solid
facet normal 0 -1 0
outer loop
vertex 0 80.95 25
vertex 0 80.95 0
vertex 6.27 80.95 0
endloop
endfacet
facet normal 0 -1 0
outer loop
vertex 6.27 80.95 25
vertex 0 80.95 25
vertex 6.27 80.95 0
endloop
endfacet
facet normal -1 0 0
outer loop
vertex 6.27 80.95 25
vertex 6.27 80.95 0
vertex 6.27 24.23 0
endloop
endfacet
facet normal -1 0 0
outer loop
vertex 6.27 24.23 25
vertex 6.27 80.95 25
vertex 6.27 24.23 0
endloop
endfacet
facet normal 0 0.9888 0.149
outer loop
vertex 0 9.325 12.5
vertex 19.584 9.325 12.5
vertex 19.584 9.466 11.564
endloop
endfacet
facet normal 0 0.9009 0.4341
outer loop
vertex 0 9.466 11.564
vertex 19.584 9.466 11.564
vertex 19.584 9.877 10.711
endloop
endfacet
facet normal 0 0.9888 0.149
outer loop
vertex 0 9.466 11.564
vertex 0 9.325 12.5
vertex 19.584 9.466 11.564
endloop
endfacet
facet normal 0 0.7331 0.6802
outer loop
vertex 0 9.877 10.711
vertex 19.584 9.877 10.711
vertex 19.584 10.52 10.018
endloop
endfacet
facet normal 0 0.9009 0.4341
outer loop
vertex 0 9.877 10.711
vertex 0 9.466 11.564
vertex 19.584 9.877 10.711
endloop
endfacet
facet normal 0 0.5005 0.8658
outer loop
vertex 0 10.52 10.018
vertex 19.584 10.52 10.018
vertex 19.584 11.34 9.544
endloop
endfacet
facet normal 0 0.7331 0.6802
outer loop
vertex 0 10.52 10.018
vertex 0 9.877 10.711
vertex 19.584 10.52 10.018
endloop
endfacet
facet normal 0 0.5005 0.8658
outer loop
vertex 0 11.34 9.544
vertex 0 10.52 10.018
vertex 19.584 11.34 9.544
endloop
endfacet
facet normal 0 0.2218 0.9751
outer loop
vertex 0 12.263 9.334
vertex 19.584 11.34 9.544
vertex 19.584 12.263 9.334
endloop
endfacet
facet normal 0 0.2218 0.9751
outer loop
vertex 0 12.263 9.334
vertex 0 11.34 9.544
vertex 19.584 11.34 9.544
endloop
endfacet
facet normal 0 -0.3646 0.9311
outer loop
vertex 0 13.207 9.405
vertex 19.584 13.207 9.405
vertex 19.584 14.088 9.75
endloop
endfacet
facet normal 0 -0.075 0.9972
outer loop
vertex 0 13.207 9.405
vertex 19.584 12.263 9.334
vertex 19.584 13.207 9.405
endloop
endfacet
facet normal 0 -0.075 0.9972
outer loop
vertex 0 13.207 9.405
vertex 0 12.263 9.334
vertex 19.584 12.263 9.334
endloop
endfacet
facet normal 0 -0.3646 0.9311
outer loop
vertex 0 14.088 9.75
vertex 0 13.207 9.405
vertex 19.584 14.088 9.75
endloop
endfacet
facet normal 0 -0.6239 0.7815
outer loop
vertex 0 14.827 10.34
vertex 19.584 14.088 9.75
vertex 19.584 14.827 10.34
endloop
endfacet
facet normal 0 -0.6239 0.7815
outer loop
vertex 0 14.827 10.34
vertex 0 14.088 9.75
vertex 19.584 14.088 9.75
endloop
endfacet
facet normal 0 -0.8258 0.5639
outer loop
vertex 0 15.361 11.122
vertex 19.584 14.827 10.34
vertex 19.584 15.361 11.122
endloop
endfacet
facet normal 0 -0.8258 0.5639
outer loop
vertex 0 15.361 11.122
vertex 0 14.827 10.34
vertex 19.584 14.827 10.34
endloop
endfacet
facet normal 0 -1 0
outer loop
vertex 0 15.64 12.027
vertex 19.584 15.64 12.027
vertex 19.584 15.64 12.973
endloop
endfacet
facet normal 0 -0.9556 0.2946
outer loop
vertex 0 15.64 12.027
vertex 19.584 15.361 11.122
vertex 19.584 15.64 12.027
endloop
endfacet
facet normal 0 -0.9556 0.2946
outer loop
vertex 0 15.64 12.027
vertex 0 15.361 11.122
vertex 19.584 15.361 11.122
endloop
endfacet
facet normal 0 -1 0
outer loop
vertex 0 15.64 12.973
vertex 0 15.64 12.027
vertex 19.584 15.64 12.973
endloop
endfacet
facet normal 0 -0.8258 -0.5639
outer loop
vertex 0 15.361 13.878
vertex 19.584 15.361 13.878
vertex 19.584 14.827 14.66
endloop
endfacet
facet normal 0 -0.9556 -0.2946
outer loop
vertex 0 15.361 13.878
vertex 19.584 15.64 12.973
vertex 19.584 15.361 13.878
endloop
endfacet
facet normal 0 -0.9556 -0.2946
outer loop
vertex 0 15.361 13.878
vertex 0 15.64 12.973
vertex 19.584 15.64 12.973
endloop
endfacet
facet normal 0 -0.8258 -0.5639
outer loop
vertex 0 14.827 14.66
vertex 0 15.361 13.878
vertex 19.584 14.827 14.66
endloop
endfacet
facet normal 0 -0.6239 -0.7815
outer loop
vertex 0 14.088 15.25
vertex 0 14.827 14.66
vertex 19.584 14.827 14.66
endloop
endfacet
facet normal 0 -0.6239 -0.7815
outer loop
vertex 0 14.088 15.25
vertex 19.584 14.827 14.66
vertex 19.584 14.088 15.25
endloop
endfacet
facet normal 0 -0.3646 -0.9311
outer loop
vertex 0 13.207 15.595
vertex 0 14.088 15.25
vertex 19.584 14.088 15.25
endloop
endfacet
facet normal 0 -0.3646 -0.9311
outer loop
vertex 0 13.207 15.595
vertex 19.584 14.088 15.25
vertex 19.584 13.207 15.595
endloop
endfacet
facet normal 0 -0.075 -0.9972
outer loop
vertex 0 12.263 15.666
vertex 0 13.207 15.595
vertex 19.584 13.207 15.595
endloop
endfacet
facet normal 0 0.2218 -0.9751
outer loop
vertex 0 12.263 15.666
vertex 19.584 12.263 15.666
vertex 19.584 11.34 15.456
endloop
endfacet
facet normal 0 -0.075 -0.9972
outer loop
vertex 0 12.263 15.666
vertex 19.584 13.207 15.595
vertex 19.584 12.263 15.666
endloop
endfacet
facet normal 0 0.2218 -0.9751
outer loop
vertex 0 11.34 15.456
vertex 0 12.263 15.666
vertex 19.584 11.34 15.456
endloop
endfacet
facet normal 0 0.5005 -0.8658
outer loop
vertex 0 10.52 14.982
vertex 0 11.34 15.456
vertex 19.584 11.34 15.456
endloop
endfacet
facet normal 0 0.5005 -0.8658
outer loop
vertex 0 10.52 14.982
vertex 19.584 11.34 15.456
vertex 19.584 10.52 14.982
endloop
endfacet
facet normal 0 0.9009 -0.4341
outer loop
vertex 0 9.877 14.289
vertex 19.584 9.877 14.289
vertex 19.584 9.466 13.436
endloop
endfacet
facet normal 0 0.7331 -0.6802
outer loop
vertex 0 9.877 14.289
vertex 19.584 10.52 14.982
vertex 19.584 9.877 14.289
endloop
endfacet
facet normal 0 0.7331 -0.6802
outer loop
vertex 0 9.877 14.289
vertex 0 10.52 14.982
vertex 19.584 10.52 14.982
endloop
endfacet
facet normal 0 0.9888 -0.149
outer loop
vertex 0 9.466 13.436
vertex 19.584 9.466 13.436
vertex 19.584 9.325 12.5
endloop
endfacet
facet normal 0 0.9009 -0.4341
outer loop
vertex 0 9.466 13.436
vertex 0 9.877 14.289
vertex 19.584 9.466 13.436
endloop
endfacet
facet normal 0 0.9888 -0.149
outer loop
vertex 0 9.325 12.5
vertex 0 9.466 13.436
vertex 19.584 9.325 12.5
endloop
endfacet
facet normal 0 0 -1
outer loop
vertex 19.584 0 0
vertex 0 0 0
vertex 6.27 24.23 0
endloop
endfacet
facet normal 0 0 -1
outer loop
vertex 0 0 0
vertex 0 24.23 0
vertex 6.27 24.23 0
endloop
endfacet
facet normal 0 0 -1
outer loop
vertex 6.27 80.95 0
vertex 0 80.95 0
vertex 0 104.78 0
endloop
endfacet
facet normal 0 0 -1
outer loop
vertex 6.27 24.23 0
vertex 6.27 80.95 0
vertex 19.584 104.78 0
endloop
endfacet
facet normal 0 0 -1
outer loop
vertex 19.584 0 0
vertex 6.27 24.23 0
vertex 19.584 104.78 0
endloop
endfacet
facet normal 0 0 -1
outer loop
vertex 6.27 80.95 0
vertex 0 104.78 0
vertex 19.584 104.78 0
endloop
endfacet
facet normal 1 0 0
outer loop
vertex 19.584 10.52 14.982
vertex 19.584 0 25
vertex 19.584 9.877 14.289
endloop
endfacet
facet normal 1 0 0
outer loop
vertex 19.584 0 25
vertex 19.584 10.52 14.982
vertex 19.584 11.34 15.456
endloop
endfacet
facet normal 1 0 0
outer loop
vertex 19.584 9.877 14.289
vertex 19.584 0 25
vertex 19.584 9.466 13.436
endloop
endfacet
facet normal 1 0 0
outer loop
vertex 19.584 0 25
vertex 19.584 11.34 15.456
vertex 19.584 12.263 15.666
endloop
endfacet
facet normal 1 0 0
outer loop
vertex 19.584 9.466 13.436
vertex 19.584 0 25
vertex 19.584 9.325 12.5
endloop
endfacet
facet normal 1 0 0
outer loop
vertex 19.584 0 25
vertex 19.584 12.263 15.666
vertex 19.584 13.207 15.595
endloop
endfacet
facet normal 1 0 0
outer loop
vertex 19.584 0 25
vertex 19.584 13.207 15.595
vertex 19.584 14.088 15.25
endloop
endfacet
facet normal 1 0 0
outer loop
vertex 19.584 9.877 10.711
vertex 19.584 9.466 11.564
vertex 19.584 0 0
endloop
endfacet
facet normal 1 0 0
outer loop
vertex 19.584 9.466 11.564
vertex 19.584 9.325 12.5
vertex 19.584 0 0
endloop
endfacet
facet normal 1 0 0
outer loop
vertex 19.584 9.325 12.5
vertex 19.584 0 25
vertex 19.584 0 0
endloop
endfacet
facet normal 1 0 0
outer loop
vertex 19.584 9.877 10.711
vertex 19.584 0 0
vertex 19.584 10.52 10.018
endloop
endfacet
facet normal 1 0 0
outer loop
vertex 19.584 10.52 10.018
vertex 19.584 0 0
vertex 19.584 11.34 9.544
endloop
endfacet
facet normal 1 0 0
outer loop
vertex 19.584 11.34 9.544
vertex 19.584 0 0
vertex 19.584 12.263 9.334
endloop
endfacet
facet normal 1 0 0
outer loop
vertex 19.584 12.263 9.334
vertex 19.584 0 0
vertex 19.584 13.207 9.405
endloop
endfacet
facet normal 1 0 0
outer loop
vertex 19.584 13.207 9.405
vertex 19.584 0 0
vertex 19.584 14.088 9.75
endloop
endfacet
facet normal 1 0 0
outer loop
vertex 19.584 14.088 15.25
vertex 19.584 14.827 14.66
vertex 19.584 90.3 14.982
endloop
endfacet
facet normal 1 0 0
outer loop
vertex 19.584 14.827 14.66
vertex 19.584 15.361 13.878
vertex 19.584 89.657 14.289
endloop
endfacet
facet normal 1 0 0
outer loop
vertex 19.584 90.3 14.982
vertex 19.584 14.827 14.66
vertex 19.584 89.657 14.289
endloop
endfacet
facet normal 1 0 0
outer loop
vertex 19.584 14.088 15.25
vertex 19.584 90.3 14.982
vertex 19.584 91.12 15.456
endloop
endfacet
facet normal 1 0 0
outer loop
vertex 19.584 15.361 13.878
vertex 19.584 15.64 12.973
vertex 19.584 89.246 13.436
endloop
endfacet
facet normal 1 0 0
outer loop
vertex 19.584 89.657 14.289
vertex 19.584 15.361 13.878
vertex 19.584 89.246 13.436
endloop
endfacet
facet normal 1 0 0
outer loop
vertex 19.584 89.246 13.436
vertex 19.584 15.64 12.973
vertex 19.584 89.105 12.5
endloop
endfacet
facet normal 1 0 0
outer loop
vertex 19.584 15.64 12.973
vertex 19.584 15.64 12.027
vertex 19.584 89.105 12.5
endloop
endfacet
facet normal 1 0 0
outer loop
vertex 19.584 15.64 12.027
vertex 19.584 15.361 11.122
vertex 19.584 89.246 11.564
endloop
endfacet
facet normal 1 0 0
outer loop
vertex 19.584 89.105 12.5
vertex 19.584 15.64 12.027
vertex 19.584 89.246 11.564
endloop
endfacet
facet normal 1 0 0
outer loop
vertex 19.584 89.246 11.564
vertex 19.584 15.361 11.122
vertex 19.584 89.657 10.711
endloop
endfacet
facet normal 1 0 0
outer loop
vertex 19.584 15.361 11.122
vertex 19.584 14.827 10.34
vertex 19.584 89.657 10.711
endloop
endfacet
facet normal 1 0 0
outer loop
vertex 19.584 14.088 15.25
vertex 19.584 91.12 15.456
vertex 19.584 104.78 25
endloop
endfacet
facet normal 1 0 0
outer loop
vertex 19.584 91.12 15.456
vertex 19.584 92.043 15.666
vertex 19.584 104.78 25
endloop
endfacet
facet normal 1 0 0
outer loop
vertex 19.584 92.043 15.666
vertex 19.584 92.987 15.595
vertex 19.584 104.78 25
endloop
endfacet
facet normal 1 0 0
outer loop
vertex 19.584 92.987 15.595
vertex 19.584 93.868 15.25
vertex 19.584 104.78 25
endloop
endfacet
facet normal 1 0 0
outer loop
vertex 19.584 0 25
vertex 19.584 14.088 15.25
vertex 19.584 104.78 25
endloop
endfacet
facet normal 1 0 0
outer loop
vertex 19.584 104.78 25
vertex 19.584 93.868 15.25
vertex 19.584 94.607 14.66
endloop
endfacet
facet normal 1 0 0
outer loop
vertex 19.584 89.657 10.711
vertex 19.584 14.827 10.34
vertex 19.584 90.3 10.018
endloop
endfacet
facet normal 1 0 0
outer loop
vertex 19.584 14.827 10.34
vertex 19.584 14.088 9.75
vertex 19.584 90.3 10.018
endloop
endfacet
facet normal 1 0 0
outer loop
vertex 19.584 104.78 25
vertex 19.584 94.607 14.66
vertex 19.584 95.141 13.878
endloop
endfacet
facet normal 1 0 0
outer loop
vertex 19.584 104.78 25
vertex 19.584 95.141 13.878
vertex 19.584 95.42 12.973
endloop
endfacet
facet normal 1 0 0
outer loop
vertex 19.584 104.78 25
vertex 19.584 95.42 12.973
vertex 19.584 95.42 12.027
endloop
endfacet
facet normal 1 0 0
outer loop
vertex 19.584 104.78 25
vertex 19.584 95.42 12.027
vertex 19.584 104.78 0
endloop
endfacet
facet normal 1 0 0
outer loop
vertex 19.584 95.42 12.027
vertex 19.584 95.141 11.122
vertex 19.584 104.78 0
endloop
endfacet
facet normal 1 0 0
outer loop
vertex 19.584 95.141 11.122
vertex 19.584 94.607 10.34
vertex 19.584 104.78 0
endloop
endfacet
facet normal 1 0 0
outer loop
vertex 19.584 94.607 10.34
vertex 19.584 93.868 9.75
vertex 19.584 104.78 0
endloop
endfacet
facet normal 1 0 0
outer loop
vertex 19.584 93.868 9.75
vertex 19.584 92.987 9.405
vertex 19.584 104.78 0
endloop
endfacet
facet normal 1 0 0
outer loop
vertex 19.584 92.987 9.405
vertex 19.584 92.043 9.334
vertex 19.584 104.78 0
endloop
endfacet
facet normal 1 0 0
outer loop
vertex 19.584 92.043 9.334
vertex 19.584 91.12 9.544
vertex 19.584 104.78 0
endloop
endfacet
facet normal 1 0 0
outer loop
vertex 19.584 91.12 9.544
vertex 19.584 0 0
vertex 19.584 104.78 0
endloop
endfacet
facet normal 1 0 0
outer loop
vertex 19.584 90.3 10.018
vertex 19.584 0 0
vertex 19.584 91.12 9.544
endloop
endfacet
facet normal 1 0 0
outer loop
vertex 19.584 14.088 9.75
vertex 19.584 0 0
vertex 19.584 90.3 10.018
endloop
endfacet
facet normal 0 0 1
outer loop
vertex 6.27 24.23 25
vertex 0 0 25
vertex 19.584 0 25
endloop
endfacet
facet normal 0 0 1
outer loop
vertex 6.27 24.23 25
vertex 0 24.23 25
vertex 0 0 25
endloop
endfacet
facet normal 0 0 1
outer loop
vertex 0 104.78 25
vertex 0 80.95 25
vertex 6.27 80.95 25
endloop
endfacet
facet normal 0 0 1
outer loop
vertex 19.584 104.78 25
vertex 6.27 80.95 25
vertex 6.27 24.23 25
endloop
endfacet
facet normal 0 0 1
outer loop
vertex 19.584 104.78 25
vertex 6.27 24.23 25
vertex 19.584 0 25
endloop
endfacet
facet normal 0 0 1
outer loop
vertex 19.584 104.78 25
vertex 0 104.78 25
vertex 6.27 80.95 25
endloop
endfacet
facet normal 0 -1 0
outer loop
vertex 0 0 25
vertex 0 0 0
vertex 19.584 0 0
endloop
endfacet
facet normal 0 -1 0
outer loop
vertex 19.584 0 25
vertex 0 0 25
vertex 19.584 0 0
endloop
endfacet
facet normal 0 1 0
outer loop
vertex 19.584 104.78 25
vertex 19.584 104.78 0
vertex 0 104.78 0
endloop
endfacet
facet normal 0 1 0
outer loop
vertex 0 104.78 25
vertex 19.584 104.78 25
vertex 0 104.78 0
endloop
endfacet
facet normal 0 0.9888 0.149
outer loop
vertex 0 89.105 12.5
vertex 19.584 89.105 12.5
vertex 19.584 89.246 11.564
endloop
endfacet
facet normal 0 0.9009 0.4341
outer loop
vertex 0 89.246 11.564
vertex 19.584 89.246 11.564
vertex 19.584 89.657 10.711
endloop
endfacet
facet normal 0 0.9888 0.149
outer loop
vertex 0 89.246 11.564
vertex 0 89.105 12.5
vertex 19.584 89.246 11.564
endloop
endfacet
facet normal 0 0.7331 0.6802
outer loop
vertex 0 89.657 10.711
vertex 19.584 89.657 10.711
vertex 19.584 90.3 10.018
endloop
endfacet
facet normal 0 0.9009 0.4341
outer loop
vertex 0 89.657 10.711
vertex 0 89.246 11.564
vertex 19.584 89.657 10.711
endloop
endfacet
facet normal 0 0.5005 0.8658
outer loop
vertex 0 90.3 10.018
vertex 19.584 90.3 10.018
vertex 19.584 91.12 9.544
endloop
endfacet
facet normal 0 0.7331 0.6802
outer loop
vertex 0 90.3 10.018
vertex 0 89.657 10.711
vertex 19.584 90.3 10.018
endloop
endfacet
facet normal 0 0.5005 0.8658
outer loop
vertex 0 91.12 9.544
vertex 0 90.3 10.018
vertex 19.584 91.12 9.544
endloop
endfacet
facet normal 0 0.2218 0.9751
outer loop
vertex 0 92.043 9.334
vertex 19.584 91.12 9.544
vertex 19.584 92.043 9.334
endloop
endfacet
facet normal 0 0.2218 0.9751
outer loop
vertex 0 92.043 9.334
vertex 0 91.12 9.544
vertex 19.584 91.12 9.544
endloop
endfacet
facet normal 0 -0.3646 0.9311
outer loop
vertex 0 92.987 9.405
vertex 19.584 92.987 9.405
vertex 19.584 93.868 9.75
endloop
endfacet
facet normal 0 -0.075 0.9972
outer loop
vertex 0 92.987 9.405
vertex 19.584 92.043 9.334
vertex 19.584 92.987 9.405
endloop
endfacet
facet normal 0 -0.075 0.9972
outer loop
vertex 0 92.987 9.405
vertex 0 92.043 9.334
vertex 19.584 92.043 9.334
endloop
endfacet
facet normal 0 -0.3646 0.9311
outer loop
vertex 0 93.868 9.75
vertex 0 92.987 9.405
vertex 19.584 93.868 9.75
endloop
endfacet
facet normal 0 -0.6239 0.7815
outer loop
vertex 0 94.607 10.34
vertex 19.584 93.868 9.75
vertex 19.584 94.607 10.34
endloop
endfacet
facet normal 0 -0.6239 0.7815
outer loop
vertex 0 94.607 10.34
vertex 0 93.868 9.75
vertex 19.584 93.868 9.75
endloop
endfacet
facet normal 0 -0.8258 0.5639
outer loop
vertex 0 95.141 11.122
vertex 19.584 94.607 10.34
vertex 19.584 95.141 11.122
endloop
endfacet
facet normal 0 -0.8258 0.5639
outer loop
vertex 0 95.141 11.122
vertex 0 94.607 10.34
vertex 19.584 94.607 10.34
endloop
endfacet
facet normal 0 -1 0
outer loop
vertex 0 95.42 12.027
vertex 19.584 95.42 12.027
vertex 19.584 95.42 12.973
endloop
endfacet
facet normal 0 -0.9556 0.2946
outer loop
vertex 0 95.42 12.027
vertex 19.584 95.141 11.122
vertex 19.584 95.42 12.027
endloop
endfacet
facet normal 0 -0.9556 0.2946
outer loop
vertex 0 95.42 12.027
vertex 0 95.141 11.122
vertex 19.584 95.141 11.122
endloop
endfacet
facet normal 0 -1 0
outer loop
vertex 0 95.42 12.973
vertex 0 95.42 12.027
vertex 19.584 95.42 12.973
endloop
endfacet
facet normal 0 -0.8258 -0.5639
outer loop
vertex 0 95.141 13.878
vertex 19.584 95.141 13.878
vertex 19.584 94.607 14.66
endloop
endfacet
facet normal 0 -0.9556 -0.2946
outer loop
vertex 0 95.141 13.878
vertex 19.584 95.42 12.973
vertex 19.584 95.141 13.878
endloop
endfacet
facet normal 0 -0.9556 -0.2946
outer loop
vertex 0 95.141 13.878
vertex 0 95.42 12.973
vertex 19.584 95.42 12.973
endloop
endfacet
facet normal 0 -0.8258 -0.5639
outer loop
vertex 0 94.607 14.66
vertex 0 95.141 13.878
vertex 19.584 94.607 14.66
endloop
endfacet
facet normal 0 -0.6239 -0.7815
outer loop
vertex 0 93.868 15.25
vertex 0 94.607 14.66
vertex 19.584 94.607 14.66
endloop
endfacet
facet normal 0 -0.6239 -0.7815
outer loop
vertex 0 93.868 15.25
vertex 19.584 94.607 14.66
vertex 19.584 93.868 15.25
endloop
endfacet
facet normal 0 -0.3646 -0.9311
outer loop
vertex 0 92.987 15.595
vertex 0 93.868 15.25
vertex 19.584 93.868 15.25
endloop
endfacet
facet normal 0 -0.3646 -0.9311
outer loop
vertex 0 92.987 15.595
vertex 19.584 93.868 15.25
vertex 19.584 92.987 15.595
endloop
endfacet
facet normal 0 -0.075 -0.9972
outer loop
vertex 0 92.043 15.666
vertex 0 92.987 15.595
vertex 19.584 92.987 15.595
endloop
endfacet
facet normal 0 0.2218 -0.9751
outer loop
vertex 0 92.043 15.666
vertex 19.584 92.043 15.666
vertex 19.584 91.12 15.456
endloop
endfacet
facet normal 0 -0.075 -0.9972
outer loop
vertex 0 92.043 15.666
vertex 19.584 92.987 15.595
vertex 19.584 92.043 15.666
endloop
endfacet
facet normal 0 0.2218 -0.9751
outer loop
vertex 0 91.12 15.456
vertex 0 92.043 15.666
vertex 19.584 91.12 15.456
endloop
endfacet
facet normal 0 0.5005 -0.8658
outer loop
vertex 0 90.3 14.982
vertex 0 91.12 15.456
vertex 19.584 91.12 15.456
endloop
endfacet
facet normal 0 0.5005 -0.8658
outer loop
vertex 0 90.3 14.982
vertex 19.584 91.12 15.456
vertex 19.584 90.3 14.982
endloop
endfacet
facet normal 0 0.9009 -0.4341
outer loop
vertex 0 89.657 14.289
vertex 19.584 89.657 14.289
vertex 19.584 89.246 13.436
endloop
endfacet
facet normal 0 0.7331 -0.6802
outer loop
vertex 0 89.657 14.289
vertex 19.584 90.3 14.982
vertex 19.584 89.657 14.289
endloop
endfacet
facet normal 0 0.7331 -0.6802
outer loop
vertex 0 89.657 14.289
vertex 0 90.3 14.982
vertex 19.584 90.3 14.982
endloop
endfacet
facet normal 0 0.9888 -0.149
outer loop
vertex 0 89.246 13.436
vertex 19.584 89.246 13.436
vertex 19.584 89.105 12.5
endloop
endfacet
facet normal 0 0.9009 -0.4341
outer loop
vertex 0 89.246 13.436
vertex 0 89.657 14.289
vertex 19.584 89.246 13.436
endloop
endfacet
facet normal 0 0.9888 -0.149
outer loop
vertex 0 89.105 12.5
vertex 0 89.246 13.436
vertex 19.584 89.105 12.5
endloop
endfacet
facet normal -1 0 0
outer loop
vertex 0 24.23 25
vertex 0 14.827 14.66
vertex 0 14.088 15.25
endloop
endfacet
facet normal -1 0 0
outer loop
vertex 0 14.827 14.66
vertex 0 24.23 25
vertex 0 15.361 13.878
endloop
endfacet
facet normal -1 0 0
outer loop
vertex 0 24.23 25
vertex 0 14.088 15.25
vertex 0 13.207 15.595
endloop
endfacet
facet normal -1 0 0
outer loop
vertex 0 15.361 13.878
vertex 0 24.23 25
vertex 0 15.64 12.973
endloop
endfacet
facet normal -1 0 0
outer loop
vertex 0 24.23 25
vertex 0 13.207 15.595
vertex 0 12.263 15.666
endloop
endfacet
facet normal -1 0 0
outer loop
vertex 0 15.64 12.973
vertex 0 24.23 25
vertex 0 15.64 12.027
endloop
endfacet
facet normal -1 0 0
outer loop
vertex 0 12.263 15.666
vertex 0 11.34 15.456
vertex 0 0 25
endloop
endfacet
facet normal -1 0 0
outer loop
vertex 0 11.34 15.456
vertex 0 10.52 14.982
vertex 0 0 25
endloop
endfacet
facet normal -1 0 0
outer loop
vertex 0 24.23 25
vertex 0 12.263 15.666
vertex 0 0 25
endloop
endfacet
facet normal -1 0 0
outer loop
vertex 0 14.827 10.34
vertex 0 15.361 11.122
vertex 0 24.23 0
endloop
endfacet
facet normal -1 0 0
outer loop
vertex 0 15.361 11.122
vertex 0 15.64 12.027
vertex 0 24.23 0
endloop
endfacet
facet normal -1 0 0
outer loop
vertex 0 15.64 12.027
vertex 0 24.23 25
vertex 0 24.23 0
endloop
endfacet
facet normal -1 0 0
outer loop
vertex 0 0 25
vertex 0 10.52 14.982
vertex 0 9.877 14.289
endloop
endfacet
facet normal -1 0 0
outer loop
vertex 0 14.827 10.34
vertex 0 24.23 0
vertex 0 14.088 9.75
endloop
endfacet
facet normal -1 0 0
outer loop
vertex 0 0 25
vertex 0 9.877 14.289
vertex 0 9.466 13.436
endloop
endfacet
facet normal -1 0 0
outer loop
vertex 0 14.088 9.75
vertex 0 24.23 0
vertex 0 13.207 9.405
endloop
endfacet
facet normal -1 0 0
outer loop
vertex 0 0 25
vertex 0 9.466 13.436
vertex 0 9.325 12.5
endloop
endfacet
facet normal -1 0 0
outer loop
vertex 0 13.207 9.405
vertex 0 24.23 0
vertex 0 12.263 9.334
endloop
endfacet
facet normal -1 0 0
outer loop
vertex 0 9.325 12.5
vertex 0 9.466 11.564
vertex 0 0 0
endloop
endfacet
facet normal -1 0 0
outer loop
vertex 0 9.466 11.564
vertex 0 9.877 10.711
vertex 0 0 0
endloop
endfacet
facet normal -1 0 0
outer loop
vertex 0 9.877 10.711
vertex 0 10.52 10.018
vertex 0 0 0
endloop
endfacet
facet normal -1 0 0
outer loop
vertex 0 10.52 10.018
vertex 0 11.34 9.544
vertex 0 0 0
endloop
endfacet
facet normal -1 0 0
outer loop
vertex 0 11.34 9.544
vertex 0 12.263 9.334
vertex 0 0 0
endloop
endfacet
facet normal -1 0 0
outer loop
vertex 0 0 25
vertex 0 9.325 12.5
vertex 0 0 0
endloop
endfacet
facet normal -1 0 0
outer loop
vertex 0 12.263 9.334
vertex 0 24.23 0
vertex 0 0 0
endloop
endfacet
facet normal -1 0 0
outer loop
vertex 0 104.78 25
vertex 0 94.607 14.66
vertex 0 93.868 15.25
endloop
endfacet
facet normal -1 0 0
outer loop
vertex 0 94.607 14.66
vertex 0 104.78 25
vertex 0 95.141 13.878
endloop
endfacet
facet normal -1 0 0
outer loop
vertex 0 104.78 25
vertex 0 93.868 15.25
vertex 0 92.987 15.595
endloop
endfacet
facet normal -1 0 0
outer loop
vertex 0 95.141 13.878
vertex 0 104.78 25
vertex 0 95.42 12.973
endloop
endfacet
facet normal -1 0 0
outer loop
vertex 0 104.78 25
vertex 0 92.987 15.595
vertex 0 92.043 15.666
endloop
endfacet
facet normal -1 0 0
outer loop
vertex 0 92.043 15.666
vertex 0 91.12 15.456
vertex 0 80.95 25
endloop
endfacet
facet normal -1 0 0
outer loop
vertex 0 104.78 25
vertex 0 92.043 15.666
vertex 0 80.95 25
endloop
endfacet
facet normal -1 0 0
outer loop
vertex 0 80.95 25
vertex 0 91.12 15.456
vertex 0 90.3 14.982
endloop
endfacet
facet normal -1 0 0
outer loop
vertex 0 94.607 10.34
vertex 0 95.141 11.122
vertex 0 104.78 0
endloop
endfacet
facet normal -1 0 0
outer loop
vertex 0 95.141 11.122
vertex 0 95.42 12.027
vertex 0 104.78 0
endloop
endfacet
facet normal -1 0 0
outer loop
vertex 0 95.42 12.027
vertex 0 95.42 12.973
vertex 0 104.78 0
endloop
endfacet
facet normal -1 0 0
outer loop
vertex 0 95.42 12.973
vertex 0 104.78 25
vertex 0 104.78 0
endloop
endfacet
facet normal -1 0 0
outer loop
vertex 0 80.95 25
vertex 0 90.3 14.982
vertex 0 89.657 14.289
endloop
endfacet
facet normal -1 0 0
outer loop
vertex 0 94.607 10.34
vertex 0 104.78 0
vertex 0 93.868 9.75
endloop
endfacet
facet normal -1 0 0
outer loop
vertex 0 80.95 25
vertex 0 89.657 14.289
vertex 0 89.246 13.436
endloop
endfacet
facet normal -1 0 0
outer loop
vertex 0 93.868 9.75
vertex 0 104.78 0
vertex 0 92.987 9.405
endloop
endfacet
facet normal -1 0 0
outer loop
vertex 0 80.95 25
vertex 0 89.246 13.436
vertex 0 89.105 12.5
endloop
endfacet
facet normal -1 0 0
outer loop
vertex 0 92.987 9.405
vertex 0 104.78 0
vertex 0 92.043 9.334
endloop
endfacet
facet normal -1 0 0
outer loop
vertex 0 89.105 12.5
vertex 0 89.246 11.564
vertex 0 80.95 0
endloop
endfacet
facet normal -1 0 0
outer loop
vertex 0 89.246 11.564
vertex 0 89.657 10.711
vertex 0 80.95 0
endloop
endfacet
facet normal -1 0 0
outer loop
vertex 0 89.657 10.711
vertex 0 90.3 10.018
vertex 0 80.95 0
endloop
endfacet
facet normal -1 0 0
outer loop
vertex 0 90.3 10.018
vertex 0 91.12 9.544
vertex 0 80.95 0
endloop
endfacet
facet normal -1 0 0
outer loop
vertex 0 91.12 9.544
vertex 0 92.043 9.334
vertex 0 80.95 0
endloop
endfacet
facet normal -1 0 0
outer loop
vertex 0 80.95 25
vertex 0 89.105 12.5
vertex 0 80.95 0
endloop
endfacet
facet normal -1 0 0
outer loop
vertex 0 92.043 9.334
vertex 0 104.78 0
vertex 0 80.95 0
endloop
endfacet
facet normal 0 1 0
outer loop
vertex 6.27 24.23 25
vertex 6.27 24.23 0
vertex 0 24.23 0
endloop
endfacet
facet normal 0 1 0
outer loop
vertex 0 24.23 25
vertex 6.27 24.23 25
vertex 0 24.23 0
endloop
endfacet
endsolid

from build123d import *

# Parameters (mm, degrees)
BOSS_EXTRUDE1_DEPTH = 25
SKETCH2_R           = 3.175
CUT_EXTRUDE1_DEPTH  = 40


with BuildPart() as part:
    # Sketch1 → Boss-Extrude1 (new body)
    with BuildSketch(Plane.XY):
        Polygon((0, 0), (19.584, 0), (19.584, 104.78), (0, 104.78), (0, 80.95), (6.27, 80.95), (6.27, 24.23), (0, 24.23), align=None)
    extrude(amount=BOSS_EXTRUDE1_DEPTH)

    # Sketch2 → Cut-Extrude1 (cut)
    with BuildSketch(Plane(origin=(0, 0, 0), x_dir=(0, 0, -1), z_dir=(1, 0, 0))):
        with Locations(Location((-12.5, 92.28, 0), (0, 0, 270))):
            Circle(SKETCH2_R)
        with Locations(Location((-12.5, 12.5, 0), (0, 0, 270))):
            Circle(SKETCH2_R)
    extrude(amount=CUT_EXTRUDE1_DEPTH, mode=Mode.SUBTRACT)


solid = part.part
